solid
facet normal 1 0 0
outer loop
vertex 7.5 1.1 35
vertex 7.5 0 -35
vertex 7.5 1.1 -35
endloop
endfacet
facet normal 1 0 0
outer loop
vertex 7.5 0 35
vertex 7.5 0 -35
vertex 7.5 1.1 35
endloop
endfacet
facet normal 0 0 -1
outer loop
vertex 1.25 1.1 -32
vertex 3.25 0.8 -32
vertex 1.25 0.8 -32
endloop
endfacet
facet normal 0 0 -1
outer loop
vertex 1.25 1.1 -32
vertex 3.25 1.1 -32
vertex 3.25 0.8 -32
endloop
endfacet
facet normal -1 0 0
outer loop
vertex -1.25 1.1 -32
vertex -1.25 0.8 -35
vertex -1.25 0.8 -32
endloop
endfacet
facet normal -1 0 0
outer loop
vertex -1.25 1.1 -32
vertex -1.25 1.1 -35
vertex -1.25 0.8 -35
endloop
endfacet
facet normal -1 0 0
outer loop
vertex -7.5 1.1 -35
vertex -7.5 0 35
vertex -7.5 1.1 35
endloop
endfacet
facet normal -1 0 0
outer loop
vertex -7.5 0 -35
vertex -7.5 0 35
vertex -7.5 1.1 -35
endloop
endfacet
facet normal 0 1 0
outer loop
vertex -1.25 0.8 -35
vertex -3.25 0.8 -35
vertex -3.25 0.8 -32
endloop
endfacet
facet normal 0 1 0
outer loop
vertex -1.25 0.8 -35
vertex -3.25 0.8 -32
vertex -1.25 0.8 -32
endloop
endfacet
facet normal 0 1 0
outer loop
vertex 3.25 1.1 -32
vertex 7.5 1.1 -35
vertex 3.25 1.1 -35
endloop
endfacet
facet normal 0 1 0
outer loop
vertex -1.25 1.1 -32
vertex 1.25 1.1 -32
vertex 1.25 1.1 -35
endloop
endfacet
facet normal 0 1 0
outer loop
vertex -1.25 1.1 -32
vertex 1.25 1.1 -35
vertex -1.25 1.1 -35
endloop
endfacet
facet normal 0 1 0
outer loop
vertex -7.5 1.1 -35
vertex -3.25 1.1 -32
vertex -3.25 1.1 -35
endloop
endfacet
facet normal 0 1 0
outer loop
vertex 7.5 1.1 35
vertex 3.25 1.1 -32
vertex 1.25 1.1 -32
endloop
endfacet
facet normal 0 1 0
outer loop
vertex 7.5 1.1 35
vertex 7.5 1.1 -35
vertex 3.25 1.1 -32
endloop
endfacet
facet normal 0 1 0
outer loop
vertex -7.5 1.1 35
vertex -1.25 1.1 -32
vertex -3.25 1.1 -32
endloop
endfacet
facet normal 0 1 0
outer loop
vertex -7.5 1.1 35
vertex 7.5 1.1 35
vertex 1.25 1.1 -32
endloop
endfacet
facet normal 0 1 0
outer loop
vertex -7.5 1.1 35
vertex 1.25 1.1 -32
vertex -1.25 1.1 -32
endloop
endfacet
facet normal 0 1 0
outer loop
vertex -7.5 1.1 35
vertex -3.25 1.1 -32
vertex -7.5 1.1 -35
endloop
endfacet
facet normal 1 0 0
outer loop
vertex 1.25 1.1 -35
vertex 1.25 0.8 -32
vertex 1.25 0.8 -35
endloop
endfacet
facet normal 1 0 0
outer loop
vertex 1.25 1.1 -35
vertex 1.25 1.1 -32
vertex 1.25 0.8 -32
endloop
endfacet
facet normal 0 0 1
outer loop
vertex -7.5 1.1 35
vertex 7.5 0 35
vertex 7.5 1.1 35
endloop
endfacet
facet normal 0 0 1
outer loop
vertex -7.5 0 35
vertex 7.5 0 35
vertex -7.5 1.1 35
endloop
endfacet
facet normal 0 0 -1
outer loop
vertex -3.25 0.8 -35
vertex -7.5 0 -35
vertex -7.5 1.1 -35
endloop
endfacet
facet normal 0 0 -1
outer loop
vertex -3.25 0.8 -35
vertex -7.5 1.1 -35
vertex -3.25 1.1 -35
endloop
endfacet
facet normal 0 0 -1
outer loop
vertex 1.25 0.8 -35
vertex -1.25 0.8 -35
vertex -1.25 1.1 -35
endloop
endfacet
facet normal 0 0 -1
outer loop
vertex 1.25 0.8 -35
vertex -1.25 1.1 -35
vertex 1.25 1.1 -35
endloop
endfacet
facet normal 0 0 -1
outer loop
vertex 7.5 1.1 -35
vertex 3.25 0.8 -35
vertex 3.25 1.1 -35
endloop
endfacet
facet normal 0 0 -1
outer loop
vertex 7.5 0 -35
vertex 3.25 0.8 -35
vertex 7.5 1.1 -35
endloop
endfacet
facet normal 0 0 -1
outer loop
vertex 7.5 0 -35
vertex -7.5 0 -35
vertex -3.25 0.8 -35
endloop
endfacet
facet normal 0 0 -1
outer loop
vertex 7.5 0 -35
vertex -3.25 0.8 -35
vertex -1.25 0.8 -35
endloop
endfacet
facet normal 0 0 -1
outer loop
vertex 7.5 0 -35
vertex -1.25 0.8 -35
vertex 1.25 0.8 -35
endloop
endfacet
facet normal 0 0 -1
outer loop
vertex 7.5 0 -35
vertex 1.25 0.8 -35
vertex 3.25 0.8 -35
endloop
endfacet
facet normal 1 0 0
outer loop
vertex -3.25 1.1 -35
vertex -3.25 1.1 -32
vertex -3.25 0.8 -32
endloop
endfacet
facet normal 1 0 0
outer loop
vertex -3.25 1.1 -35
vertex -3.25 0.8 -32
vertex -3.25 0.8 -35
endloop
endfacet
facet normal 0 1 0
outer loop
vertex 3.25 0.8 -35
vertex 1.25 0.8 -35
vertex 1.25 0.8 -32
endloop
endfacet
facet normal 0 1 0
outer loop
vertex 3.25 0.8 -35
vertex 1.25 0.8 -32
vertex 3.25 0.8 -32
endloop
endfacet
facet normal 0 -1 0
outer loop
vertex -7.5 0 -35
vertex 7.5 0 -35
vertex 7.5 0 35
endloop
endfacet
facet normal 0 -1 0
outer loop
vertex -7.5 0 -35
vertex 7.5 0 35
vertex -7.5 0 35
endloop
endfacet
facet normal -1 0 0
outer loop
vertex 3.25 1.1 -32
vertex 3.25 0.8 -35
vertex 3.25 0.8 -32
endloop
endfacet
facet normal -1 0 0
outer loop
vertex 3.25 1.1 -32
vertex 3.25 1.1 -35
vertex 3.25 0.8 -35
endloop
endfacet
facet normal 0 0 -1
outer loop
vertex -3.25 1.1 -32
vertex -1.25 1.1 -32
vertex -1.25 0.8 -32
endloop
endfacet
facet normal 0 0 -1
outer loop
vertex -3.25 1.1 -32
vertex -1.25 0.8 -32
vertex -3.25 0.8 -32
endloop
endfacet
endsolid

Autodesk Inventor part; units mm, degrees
ref_plane "YZ Plane" through (0, 0, 0) normal (1, 0, 0) x (0, 1, 0)
ref_plane "XZ Plane" through (0, 0, 0) normal (0, 1, 0) x (-1, 0, 0)
ref_plane "XY Plane" through (0, 0, 0) normal (0, 0, 1) x (1, 0, 0)
sketch "Esquisse1" plane through (0, 0, 0) normal (0, 1, 0) x (-1, 0, 0)
  line L0 (-7.5, 35) -> (7.5, 35)
  line L1 (7.5, 35) -> (7.5, -35)
  line L2 (7.5, -35) -> (-7.5, -35)
  line L3 (-7.5, -35) -> (-7.5, 35)
  line L4 (-7.5, 35) -> (7.5, -35) construction
  line L5 (7.5, 35) -> (-7.5, -35) construction
  point P0 (0, 0)
  dimension "d0" = 15
  dimension "d1" = 70
extrude "Extrusion1" add sketch "Esquisse1" along normal blind 1.1
sketch "Esquisse2" plane through (0, 1.1, 0) normal (0, 1, 0) x (1, 0, 0)
  line L0 (7.5, 35) -> (-7.5, 35) projected
  line L1 (1.25, 35) -> (3.25, 35)
  line L2 (3.25, 35) -> (3.25, 32)
  line L3 (3.25, 32) -> (1.25, 32)
  line L4 (1.25, 32) -> (1.25, 35)
  line L5 (-3.25, 35) -> (-1.25, 35)
  line L6 (-1.25, 35) -> (-1.25, 32)
  line L7 (-1.25, 32) -> (-3.25, 32)
  line L8 (-3.25, 32) -> (-3.25, 35)
  line L9 (0, 35) -> (0, 28.8087) construction
  point P0 (0, 0)
  point P1 (-1.25, 33.5)
  dimension "d4" = 2
  dimension "d5" = 3
  dimension "d6" = 2
  dimension "d7" = 2.5
  dimension "d8" = 1.25
extrude "Extrusion2" cut sketch "Esquisse2" against normal blind 0.3
properties part number "Resistance_chauffante_ceramique"
